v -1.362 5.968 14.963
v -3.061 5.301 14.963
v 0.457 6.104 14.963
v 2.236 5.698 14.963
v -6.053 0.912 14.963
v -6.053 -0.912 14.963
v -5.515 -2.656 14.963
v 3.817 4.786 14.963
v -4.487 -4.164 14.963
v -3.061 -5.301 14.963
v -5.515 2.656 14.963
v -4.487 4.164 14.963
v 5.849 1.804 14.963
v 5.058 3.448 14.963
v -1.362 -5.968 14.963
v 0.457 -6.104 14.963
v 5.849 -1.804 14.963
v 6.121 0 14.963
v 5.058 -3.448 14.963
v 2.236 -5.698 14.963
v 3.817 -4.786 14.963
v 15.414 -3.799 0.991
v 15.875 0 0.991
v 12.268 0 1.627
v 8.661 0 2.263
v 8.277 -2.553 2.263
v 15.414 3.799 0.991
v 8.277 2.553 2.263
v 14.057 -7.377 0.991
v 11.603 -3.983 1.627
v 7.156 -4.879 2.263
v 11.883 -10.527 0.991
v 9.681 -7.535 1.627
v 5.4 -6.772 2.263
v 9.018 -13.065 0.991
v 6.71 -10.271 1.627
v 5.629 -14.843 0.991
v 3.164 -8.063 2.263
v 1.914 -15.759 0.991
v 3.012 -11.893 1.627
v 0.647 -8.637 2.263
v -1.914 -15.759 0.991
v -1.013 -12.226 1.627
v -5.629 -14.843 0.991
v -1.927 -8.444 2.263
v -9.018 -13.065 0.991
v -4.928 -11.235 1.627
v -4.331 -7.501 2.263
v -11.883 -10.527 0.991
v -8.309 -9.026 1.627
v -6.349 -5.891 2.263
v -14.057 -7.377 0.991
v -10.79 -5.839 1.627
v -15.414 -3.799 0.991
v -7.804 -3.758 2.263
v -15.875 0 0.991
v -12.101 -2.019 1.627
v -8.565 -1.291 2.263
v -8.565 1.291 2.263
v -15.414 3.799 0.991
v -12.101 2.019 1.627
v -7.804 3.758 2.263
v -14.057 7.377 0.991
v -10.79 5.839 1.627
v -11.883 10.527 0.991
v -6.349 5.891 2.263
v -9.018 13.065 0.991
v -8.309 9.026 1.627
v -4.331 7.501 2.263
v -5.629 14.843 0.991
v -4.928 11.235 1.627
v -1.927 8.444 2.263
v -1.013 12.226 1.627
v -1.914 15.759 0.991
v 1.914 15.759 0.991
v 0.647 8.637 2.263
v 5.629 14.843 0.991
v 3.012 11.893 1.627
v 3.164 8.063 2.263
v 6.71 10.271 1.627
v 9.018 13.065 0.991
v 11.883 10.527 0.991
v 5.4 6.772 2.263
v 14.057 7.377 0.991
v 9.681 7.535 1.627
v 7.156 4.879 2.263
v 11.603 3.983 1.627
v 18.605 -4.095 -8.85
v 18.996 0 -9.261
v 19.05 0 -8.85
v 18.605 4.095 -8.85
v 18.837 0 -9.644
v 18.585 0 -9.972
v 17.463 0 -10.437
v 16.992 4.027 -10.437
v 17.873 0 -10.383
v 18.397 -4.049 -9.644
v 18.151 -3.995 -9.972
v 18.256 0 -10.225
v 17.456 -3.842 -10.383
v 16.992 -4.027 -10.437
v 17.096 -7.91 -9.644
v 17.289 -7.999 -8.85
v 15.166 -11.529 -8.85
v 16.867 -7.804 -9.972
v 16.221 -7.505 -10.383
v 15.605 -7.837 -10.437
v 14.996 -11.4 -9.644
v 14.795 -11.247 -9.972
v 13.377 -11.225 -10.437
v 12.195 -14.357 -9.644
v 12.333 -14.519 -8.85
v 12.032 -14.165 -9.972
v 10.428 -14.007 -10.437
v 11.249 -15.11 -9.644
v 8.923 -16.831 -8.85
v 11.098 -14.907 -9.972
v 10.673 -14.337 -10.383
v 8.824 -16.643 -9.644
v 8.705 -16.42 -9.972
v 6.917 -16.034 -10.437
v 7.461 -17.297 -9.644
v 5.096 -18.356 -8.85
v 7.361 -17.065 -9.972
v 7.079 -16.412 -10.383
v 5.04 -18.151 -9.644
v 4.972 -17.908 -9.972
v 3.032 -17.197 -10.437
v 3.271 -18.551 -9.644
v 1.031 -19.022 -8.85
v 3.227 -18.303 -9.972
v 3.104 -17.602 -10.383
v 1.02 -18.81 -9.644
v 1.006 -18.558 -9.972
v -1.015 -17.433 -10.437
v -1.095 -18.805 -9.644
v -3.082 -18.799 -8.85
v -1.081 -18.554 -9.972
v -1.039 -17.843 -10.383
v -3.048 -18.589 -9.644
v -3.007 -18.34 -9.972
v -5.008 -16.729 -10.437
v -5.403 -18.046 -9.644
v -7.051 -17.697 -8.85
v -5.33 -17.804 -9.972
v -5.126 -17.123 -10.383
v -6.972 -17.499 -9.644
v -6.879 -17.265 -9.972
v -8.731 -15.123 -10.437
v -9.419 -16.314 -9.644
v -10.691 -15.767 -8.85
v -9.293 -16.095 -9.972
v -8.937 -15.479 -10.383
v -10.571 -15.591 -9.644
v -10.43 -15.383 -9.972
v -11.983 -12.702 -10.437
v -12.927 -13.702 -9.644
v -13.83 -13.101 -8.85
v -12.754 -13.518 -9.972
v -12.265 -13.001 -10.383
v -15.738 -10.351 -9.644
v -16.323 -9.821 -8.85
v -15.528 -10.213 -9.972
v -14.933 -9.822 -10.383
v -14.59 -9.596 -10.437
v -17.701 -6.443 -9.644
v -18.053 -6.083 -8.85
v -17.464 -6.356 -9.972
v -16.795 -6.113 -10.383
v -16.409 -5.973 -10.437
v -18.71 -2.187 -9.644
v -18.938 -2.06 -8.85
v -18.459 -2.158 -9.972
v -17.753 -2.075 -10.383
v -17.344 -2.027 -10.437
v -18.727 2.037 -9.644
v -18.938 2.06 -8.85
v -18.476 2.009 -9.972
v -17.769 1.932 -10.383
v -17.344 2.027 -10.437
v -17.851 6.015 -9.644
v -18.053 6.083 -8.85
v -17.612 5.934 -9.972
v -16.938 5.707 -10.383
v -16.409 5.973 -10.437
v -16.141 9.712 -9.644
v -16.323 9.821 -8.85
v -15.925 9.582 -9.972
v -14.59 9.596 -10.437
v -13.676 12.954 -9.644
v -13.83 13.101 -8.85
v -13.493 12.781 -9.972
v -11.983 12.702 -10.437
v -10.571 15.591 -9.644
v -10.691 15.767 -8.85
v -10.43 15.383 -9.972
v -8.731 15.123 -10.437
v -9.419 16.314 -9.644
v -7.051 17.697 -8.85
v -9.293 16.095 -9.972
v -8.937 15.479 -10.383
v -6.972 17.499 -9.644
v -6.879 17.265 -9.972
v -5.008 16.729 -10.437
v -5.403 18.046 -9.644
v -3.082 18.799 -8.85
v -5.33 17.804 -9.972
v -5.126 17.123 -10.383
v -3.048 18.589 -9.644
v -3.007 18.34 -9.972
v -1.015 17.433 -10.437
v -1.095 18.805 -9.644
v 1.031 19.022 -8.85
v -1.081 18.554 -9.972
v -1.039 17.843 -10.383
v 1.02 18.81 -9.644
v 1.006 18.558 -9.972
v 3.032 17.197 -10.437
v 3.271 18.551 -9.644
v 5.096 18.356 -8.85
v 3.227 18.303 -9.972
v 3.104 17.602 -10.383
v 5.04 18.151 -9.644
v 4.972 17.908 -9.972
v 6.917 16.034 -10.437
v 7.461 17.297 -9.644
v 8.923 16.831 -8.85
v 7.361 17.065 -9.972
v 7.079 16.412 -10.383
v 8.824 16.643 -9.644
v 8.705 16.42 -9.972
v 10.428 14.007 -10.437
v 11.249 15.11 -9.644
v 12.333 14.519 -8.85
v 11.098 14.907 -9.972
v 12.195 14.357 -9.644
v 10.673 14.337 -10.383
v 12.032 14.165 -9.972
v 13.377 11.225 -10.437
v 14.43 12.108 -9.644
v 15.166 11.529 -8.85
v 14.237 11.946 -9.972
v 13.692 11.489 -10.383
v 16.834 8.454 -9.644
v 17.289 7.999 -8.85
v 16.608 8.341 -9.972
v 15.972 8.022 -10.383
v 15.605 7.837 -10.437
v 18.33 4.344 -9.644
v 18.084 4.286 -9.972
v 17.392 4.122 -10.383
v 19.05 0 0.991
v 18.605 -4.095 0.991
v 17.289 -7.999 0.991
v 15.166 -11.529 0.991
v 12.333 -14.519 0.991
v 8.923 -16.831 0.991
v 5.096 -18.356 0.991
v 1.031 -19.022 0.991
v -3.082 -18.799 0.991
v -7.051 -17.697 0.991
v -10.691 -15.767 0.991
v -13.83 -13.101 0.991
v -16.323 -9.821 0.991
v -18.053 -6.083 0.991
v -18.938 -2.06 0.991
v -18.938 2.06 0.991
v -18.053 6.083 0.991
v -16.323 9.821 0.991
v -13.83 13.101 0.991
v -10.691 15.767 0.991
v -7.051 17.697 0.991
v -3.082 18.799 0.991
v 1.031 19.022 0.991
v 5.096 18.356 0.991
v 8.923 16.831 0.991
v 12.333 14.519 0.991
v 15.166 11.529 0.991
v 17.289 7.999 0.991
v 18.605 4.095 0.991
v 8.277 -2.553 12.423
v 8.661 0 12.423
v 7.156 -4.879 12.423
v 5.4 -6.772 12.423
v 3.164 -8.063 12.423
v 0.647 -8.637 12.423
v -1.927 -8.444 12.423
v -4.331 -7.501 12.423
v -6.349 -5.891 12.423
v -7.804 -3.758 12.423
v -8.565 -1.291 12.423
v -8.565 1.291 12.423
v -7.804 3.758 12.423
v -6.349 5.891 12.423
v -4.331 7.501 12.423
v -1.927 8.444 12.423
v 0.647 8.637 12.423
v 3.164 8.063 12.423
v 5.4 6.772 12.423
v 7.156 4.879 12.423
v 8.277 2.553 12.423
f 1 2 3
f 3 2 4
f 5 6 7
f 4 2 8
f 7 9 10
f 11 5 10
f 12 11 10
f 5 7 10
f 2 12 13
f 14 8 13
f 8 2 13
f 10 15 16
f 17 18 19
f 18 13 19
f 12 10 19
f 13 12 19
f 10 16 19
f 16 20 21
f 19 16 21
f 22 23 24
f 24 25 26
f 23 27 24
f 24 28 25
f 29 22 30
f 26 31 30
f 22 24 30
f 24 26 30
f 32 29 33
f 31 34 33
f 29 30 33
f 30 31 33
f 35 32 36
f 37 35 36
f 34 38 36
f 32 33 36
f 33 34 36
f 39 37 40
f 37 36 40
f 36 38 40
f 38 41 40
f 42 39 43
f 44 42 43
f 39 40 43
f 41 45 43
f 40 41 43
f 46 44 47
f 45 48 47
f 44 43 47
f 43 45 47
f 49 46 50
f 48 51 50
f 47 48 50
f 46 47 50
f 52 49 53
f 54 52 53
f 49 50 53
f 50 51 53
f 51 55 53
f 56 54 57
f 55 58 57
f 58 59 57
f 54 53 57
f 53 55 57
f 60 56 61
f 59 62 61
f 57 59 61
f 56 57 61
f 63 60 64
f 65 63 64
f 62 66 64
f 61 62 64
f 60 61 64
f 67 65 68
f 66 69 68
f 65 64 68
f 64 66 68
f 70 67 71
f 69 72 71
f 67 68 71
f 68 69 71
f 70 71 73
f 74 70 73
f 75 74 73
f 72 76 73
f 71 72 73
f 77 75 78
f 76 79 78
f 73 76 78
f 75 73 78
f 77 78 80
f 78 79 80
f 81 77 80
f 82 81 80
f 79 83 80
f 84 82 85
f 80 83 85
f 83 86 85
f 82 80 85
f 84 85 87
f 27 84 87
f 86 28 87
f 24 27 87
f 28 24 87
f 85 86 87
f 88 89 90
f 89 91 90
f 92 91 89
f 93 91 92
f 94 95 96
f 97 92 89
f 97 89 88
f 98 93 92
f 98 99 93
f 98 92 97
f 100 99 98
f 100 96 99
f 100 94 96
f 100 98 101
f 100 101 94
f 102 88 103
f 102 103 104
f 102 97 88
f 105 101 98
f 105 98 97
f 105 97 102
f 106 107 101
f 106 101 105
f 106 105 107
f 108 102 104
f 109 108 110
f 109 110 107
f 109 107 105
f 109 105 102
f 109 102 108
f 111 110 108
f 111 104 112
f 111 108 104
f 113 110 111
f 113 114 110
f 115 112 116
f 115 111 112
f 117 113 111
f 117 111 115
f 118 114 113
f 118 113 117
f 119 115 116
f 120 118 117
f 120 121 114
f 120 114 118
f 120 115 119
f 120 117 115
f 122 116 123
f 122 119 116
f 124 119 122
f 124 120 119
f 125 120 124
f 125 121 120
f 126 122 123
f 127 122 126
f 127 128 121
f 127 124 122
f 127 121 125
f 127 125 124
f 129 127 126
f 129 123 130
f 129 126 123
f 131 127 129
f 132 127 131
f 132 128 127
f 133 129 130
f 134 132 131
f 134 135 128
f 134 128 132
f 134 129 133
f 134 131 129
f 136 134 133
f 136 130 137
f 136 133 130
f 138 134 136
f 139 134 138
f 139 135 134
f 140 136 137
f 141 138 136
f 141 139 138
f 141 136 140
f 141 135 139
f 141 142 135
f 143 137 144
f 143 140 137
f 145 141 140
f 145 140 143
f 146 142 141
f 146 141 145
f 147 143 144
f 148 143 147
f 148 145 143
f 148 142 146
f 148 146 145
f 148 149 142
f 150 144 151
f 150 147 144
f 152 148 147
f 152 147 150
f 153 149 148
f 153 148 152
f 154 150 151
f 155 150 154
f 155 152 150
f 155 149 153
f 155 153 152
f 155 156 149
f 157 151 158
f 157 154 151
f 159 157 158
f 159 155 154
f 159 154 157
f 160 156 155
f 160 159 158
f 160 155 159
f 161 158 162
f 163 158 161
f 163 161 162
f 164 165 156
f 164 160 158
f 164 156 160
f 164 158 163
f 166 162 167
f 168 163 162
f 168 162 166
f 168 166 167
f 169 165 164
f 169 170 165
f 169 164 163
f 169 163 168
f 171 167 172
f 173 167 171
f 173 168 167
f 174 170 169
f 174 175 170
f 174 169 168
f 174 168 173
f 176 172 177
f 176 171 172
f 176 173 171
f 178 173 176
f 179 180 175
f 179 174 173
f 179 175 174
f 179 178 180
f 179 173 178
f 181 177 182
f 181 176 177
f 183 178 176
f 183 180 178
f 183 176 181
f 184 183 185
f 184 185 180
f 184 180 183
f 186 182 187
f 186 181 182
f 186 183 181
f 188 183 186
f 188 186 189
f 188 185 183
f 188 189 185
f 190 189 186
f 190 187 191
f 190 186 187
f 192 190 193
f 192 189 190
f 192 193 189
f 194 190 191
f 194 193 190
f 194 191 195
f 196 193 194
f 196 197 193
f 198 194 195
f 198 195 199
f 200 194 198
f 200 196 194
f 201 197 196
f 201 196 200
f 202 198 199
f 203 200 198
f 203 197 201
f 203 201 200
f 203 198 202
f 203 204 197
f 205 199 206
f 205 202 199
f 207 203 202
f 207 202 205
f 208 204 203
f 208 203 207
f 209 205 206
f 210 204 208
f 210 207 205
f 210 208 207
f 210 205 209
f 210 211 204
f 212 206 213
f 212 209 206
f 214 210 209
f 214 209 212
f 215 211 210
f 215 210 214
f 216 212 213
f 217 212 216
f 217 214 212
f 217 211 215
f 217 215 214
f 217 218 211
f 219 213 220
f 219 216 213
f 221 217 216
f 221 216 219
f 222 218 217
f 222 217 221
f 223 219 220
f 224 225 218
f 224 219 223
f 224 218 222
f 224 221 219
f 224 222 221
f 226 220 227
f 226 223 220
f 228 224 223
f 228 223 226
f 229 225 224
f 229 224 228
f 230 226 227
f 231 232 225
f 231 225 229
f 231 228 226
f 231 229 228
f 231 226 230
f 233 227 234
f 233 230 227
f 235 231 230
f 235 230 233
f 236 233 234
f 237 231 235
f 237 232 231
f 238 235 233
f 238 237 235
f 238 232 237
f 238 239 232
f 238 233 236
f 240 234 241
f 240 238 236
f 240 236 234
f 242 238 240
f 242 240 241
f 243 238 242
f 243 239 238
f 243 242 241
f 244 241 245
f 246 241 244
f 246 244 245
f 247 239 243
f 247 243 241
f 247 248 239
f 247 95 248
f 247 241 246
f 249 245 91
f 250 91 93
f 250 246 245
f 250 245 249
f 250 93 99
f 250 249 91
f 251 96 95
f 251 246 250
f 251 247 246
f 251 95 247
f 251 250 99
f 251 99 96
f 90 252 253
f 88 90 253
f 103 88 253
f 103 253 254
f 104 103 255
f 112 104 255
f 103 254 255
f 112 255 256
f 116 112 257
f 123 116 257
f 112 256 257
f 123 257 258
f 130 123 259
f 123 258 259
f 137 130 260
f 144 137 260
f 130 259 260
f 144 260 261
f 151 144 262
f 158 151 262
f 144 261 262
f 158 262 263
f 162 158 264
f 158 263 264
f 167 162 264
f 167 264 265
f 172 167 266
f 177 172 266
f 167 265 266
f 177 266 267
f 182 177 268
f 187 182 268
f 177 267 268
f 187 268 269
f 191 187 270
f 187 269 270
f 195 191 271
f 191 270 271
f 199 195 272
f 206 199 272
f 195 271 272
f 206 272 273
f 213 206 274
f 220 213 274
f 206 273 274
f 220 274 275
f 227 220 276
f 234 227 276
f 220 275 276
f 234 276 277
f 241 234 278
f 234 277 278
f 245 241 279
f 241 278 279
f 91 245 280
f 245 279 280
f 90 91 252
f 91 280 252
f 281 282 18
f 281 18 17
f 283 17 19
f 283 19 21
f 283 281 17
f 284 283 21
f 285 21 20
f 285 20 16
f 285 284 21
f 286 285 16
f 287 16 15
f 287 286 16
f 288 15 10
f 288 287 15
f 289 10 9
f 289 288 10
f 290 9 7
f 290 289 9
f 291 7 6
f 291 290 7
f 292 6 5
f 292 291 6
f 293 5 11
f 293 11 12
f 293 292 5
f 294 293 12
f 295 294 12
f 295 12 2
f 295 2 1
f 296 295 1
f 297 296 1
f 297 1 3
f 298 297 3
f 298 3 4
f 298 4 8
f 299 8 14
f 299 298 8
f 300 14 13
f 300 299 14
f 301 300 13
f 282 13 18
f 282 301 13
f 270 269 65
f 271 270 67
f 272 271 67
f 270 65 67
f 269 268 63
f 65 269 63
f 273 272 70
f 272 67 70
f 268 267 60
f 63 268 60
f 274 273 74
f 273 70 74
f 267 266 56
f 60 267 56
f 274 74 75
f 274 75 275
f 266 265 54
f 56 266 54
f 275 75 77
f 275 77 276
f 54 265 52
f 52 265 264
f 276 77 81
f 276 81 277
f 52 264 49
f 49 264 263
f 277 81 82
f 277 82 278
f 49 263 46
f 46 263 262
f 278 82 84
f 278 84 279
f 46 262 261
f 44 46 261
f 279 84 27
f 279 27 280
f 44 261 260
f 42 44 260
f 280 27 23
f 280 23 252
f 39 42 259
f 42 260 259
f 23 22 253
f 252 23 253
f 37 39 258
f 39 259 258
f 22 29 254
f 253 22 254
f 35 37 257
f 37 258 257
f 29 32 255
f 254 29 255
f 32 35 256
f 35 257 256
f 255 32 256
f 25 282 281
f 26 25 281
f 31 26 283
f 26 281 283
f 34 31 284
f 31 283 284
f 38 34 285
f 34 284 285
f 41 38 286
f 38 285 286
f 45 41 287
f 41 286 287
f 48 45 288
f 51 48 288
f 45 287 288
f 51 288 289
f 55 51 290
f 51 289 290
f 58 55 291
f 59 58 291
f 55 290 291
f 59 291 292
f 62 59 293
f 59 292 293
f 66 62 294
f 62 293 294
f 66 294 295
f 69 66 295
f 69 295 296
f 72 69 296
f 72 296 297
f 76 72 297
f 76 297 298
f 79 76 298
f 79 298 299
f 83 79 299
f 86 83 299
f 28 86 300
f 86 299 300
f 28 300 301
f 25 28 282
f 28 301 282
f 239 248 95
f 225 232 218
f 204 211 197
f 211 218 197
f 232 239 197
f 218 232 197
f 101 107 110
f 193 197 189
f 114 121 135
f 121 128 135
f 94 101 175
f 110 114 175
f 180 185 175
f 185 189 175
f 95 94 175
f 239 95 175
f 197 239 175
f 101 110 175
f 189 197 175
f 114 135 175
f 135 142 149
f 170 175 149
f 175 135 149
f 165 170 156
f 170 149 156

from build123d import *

# Parameters (mm, degrees)
F2_SIZE = 2.54
F3_R    = 1.5875


with BuildPart() as f1:
    # F0 (on Front) → F1 (revolve)
    with BuildSketch(Plane.XZ):
        Polygon((8.6614, 14.962643), (0, 14.962643), (0, -10.437357), (19.05, -10.437357), (19.05, 0.990691), (15.875, 0.990691), (8.6614, 2.262643), align=None)
    revolve(axis=Axis((0, 0, 1.824711), (0, 0, -1)))

    # F2
    f2_edges = [f1.edges().sort_by_distance(p)[0] for p in [
        (-8.6614, 0, 14.962643),
    ]]
    chamfer(f2_edges, length=F2_SIZE)

    # F3
    f3_edges = [f1.edges().sort_by_distance(p)[0] for p in [
        (-19.05, 0, -10.437357),
    ]]
    fillet(f3_edges, radius=F3_R)


solid = f1.part
